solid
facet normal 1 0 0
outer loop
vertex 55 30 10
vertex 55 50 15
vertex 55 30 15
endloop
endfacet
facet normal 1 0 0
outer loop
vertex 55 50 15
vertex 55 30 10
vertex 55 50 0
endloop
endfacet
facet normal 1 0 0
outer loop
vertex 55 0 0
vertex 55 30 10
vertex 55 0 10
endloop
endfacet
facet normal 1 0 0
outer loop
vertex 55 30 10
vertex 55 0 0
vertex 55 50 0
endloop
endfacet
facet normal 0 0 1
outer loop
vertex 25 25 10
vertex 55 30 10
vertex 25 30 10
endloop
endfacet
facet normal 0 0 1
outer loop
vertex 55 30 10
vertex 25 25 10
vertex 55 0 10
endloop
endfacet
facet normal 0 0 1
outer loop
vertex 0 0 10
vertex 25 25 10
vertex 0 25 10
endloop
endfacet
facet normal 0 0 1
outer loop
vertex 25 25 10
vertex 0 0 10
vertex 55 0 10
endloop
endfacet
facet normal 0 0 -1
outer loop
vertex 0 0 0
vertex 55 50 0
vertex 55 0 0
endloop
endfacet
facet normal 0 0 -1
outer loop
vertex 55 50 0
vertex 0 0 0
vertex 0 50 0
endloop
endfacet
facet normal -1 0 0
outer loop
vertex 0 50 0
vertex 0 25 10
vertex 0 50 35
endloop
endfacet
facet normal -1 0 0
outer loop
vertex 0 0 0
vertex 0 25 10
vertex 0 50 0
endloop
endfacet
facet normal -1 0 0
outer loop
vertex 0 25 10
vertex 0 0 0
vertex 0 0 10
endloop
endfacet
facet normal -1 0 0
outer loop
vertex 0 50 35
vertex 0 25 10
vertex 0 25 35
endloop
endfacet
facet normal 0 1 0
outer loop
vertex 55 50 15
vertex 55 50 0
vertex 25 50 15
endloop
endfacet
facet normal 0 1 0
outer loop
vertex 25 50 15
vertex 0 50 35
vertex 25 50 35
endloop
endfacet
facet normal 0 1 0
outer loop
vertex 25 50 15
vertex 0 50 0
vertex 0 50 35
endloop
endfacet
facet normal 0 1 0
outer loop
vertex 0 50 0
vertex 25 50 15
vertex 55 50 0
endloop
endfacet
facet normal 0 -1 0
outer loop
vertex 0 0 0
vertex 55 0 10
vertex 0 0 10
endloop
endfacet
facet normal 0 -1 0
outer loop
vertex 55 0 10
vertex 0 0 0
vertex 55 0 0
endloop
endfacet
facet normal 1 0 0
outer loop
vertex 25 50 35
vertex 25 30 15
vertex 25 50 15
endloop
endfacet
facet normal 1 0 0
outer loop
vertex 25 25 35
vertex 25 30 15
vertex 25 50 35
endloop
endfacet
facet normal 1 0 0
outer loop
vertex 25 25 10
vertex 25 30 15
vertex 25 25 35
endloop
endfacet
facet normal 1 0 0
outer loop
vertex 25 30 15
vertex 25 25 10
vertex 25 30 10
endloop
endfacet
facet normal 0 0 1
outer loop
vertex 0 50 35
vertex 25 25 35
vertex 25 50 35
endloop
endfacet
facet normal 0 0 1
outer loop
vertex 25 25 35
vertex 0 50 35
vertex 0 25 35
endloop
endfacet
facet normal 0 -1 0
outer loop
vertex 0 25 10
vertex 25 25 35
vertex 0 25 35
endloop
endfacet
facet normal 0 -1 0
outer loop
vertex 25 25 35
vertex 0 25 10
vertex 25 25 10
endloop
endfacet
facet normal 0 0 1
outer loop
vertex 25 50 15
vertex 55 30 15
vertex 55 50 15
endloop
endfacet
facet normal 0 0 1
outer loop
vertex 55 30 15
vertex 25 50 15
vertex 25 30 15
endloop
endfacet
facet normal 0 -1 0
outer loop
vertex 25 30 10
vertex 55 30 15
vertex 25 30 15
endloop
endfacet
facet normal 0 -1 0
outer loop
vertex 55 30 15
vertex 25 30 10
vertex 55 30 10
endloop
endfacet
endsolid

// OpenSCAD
cube([55, 50, 10]);
translate([0, 25, 10])
cube([25, 25, 25]);
translate([25, 30, 10])
cube([30, 20, 5]);
